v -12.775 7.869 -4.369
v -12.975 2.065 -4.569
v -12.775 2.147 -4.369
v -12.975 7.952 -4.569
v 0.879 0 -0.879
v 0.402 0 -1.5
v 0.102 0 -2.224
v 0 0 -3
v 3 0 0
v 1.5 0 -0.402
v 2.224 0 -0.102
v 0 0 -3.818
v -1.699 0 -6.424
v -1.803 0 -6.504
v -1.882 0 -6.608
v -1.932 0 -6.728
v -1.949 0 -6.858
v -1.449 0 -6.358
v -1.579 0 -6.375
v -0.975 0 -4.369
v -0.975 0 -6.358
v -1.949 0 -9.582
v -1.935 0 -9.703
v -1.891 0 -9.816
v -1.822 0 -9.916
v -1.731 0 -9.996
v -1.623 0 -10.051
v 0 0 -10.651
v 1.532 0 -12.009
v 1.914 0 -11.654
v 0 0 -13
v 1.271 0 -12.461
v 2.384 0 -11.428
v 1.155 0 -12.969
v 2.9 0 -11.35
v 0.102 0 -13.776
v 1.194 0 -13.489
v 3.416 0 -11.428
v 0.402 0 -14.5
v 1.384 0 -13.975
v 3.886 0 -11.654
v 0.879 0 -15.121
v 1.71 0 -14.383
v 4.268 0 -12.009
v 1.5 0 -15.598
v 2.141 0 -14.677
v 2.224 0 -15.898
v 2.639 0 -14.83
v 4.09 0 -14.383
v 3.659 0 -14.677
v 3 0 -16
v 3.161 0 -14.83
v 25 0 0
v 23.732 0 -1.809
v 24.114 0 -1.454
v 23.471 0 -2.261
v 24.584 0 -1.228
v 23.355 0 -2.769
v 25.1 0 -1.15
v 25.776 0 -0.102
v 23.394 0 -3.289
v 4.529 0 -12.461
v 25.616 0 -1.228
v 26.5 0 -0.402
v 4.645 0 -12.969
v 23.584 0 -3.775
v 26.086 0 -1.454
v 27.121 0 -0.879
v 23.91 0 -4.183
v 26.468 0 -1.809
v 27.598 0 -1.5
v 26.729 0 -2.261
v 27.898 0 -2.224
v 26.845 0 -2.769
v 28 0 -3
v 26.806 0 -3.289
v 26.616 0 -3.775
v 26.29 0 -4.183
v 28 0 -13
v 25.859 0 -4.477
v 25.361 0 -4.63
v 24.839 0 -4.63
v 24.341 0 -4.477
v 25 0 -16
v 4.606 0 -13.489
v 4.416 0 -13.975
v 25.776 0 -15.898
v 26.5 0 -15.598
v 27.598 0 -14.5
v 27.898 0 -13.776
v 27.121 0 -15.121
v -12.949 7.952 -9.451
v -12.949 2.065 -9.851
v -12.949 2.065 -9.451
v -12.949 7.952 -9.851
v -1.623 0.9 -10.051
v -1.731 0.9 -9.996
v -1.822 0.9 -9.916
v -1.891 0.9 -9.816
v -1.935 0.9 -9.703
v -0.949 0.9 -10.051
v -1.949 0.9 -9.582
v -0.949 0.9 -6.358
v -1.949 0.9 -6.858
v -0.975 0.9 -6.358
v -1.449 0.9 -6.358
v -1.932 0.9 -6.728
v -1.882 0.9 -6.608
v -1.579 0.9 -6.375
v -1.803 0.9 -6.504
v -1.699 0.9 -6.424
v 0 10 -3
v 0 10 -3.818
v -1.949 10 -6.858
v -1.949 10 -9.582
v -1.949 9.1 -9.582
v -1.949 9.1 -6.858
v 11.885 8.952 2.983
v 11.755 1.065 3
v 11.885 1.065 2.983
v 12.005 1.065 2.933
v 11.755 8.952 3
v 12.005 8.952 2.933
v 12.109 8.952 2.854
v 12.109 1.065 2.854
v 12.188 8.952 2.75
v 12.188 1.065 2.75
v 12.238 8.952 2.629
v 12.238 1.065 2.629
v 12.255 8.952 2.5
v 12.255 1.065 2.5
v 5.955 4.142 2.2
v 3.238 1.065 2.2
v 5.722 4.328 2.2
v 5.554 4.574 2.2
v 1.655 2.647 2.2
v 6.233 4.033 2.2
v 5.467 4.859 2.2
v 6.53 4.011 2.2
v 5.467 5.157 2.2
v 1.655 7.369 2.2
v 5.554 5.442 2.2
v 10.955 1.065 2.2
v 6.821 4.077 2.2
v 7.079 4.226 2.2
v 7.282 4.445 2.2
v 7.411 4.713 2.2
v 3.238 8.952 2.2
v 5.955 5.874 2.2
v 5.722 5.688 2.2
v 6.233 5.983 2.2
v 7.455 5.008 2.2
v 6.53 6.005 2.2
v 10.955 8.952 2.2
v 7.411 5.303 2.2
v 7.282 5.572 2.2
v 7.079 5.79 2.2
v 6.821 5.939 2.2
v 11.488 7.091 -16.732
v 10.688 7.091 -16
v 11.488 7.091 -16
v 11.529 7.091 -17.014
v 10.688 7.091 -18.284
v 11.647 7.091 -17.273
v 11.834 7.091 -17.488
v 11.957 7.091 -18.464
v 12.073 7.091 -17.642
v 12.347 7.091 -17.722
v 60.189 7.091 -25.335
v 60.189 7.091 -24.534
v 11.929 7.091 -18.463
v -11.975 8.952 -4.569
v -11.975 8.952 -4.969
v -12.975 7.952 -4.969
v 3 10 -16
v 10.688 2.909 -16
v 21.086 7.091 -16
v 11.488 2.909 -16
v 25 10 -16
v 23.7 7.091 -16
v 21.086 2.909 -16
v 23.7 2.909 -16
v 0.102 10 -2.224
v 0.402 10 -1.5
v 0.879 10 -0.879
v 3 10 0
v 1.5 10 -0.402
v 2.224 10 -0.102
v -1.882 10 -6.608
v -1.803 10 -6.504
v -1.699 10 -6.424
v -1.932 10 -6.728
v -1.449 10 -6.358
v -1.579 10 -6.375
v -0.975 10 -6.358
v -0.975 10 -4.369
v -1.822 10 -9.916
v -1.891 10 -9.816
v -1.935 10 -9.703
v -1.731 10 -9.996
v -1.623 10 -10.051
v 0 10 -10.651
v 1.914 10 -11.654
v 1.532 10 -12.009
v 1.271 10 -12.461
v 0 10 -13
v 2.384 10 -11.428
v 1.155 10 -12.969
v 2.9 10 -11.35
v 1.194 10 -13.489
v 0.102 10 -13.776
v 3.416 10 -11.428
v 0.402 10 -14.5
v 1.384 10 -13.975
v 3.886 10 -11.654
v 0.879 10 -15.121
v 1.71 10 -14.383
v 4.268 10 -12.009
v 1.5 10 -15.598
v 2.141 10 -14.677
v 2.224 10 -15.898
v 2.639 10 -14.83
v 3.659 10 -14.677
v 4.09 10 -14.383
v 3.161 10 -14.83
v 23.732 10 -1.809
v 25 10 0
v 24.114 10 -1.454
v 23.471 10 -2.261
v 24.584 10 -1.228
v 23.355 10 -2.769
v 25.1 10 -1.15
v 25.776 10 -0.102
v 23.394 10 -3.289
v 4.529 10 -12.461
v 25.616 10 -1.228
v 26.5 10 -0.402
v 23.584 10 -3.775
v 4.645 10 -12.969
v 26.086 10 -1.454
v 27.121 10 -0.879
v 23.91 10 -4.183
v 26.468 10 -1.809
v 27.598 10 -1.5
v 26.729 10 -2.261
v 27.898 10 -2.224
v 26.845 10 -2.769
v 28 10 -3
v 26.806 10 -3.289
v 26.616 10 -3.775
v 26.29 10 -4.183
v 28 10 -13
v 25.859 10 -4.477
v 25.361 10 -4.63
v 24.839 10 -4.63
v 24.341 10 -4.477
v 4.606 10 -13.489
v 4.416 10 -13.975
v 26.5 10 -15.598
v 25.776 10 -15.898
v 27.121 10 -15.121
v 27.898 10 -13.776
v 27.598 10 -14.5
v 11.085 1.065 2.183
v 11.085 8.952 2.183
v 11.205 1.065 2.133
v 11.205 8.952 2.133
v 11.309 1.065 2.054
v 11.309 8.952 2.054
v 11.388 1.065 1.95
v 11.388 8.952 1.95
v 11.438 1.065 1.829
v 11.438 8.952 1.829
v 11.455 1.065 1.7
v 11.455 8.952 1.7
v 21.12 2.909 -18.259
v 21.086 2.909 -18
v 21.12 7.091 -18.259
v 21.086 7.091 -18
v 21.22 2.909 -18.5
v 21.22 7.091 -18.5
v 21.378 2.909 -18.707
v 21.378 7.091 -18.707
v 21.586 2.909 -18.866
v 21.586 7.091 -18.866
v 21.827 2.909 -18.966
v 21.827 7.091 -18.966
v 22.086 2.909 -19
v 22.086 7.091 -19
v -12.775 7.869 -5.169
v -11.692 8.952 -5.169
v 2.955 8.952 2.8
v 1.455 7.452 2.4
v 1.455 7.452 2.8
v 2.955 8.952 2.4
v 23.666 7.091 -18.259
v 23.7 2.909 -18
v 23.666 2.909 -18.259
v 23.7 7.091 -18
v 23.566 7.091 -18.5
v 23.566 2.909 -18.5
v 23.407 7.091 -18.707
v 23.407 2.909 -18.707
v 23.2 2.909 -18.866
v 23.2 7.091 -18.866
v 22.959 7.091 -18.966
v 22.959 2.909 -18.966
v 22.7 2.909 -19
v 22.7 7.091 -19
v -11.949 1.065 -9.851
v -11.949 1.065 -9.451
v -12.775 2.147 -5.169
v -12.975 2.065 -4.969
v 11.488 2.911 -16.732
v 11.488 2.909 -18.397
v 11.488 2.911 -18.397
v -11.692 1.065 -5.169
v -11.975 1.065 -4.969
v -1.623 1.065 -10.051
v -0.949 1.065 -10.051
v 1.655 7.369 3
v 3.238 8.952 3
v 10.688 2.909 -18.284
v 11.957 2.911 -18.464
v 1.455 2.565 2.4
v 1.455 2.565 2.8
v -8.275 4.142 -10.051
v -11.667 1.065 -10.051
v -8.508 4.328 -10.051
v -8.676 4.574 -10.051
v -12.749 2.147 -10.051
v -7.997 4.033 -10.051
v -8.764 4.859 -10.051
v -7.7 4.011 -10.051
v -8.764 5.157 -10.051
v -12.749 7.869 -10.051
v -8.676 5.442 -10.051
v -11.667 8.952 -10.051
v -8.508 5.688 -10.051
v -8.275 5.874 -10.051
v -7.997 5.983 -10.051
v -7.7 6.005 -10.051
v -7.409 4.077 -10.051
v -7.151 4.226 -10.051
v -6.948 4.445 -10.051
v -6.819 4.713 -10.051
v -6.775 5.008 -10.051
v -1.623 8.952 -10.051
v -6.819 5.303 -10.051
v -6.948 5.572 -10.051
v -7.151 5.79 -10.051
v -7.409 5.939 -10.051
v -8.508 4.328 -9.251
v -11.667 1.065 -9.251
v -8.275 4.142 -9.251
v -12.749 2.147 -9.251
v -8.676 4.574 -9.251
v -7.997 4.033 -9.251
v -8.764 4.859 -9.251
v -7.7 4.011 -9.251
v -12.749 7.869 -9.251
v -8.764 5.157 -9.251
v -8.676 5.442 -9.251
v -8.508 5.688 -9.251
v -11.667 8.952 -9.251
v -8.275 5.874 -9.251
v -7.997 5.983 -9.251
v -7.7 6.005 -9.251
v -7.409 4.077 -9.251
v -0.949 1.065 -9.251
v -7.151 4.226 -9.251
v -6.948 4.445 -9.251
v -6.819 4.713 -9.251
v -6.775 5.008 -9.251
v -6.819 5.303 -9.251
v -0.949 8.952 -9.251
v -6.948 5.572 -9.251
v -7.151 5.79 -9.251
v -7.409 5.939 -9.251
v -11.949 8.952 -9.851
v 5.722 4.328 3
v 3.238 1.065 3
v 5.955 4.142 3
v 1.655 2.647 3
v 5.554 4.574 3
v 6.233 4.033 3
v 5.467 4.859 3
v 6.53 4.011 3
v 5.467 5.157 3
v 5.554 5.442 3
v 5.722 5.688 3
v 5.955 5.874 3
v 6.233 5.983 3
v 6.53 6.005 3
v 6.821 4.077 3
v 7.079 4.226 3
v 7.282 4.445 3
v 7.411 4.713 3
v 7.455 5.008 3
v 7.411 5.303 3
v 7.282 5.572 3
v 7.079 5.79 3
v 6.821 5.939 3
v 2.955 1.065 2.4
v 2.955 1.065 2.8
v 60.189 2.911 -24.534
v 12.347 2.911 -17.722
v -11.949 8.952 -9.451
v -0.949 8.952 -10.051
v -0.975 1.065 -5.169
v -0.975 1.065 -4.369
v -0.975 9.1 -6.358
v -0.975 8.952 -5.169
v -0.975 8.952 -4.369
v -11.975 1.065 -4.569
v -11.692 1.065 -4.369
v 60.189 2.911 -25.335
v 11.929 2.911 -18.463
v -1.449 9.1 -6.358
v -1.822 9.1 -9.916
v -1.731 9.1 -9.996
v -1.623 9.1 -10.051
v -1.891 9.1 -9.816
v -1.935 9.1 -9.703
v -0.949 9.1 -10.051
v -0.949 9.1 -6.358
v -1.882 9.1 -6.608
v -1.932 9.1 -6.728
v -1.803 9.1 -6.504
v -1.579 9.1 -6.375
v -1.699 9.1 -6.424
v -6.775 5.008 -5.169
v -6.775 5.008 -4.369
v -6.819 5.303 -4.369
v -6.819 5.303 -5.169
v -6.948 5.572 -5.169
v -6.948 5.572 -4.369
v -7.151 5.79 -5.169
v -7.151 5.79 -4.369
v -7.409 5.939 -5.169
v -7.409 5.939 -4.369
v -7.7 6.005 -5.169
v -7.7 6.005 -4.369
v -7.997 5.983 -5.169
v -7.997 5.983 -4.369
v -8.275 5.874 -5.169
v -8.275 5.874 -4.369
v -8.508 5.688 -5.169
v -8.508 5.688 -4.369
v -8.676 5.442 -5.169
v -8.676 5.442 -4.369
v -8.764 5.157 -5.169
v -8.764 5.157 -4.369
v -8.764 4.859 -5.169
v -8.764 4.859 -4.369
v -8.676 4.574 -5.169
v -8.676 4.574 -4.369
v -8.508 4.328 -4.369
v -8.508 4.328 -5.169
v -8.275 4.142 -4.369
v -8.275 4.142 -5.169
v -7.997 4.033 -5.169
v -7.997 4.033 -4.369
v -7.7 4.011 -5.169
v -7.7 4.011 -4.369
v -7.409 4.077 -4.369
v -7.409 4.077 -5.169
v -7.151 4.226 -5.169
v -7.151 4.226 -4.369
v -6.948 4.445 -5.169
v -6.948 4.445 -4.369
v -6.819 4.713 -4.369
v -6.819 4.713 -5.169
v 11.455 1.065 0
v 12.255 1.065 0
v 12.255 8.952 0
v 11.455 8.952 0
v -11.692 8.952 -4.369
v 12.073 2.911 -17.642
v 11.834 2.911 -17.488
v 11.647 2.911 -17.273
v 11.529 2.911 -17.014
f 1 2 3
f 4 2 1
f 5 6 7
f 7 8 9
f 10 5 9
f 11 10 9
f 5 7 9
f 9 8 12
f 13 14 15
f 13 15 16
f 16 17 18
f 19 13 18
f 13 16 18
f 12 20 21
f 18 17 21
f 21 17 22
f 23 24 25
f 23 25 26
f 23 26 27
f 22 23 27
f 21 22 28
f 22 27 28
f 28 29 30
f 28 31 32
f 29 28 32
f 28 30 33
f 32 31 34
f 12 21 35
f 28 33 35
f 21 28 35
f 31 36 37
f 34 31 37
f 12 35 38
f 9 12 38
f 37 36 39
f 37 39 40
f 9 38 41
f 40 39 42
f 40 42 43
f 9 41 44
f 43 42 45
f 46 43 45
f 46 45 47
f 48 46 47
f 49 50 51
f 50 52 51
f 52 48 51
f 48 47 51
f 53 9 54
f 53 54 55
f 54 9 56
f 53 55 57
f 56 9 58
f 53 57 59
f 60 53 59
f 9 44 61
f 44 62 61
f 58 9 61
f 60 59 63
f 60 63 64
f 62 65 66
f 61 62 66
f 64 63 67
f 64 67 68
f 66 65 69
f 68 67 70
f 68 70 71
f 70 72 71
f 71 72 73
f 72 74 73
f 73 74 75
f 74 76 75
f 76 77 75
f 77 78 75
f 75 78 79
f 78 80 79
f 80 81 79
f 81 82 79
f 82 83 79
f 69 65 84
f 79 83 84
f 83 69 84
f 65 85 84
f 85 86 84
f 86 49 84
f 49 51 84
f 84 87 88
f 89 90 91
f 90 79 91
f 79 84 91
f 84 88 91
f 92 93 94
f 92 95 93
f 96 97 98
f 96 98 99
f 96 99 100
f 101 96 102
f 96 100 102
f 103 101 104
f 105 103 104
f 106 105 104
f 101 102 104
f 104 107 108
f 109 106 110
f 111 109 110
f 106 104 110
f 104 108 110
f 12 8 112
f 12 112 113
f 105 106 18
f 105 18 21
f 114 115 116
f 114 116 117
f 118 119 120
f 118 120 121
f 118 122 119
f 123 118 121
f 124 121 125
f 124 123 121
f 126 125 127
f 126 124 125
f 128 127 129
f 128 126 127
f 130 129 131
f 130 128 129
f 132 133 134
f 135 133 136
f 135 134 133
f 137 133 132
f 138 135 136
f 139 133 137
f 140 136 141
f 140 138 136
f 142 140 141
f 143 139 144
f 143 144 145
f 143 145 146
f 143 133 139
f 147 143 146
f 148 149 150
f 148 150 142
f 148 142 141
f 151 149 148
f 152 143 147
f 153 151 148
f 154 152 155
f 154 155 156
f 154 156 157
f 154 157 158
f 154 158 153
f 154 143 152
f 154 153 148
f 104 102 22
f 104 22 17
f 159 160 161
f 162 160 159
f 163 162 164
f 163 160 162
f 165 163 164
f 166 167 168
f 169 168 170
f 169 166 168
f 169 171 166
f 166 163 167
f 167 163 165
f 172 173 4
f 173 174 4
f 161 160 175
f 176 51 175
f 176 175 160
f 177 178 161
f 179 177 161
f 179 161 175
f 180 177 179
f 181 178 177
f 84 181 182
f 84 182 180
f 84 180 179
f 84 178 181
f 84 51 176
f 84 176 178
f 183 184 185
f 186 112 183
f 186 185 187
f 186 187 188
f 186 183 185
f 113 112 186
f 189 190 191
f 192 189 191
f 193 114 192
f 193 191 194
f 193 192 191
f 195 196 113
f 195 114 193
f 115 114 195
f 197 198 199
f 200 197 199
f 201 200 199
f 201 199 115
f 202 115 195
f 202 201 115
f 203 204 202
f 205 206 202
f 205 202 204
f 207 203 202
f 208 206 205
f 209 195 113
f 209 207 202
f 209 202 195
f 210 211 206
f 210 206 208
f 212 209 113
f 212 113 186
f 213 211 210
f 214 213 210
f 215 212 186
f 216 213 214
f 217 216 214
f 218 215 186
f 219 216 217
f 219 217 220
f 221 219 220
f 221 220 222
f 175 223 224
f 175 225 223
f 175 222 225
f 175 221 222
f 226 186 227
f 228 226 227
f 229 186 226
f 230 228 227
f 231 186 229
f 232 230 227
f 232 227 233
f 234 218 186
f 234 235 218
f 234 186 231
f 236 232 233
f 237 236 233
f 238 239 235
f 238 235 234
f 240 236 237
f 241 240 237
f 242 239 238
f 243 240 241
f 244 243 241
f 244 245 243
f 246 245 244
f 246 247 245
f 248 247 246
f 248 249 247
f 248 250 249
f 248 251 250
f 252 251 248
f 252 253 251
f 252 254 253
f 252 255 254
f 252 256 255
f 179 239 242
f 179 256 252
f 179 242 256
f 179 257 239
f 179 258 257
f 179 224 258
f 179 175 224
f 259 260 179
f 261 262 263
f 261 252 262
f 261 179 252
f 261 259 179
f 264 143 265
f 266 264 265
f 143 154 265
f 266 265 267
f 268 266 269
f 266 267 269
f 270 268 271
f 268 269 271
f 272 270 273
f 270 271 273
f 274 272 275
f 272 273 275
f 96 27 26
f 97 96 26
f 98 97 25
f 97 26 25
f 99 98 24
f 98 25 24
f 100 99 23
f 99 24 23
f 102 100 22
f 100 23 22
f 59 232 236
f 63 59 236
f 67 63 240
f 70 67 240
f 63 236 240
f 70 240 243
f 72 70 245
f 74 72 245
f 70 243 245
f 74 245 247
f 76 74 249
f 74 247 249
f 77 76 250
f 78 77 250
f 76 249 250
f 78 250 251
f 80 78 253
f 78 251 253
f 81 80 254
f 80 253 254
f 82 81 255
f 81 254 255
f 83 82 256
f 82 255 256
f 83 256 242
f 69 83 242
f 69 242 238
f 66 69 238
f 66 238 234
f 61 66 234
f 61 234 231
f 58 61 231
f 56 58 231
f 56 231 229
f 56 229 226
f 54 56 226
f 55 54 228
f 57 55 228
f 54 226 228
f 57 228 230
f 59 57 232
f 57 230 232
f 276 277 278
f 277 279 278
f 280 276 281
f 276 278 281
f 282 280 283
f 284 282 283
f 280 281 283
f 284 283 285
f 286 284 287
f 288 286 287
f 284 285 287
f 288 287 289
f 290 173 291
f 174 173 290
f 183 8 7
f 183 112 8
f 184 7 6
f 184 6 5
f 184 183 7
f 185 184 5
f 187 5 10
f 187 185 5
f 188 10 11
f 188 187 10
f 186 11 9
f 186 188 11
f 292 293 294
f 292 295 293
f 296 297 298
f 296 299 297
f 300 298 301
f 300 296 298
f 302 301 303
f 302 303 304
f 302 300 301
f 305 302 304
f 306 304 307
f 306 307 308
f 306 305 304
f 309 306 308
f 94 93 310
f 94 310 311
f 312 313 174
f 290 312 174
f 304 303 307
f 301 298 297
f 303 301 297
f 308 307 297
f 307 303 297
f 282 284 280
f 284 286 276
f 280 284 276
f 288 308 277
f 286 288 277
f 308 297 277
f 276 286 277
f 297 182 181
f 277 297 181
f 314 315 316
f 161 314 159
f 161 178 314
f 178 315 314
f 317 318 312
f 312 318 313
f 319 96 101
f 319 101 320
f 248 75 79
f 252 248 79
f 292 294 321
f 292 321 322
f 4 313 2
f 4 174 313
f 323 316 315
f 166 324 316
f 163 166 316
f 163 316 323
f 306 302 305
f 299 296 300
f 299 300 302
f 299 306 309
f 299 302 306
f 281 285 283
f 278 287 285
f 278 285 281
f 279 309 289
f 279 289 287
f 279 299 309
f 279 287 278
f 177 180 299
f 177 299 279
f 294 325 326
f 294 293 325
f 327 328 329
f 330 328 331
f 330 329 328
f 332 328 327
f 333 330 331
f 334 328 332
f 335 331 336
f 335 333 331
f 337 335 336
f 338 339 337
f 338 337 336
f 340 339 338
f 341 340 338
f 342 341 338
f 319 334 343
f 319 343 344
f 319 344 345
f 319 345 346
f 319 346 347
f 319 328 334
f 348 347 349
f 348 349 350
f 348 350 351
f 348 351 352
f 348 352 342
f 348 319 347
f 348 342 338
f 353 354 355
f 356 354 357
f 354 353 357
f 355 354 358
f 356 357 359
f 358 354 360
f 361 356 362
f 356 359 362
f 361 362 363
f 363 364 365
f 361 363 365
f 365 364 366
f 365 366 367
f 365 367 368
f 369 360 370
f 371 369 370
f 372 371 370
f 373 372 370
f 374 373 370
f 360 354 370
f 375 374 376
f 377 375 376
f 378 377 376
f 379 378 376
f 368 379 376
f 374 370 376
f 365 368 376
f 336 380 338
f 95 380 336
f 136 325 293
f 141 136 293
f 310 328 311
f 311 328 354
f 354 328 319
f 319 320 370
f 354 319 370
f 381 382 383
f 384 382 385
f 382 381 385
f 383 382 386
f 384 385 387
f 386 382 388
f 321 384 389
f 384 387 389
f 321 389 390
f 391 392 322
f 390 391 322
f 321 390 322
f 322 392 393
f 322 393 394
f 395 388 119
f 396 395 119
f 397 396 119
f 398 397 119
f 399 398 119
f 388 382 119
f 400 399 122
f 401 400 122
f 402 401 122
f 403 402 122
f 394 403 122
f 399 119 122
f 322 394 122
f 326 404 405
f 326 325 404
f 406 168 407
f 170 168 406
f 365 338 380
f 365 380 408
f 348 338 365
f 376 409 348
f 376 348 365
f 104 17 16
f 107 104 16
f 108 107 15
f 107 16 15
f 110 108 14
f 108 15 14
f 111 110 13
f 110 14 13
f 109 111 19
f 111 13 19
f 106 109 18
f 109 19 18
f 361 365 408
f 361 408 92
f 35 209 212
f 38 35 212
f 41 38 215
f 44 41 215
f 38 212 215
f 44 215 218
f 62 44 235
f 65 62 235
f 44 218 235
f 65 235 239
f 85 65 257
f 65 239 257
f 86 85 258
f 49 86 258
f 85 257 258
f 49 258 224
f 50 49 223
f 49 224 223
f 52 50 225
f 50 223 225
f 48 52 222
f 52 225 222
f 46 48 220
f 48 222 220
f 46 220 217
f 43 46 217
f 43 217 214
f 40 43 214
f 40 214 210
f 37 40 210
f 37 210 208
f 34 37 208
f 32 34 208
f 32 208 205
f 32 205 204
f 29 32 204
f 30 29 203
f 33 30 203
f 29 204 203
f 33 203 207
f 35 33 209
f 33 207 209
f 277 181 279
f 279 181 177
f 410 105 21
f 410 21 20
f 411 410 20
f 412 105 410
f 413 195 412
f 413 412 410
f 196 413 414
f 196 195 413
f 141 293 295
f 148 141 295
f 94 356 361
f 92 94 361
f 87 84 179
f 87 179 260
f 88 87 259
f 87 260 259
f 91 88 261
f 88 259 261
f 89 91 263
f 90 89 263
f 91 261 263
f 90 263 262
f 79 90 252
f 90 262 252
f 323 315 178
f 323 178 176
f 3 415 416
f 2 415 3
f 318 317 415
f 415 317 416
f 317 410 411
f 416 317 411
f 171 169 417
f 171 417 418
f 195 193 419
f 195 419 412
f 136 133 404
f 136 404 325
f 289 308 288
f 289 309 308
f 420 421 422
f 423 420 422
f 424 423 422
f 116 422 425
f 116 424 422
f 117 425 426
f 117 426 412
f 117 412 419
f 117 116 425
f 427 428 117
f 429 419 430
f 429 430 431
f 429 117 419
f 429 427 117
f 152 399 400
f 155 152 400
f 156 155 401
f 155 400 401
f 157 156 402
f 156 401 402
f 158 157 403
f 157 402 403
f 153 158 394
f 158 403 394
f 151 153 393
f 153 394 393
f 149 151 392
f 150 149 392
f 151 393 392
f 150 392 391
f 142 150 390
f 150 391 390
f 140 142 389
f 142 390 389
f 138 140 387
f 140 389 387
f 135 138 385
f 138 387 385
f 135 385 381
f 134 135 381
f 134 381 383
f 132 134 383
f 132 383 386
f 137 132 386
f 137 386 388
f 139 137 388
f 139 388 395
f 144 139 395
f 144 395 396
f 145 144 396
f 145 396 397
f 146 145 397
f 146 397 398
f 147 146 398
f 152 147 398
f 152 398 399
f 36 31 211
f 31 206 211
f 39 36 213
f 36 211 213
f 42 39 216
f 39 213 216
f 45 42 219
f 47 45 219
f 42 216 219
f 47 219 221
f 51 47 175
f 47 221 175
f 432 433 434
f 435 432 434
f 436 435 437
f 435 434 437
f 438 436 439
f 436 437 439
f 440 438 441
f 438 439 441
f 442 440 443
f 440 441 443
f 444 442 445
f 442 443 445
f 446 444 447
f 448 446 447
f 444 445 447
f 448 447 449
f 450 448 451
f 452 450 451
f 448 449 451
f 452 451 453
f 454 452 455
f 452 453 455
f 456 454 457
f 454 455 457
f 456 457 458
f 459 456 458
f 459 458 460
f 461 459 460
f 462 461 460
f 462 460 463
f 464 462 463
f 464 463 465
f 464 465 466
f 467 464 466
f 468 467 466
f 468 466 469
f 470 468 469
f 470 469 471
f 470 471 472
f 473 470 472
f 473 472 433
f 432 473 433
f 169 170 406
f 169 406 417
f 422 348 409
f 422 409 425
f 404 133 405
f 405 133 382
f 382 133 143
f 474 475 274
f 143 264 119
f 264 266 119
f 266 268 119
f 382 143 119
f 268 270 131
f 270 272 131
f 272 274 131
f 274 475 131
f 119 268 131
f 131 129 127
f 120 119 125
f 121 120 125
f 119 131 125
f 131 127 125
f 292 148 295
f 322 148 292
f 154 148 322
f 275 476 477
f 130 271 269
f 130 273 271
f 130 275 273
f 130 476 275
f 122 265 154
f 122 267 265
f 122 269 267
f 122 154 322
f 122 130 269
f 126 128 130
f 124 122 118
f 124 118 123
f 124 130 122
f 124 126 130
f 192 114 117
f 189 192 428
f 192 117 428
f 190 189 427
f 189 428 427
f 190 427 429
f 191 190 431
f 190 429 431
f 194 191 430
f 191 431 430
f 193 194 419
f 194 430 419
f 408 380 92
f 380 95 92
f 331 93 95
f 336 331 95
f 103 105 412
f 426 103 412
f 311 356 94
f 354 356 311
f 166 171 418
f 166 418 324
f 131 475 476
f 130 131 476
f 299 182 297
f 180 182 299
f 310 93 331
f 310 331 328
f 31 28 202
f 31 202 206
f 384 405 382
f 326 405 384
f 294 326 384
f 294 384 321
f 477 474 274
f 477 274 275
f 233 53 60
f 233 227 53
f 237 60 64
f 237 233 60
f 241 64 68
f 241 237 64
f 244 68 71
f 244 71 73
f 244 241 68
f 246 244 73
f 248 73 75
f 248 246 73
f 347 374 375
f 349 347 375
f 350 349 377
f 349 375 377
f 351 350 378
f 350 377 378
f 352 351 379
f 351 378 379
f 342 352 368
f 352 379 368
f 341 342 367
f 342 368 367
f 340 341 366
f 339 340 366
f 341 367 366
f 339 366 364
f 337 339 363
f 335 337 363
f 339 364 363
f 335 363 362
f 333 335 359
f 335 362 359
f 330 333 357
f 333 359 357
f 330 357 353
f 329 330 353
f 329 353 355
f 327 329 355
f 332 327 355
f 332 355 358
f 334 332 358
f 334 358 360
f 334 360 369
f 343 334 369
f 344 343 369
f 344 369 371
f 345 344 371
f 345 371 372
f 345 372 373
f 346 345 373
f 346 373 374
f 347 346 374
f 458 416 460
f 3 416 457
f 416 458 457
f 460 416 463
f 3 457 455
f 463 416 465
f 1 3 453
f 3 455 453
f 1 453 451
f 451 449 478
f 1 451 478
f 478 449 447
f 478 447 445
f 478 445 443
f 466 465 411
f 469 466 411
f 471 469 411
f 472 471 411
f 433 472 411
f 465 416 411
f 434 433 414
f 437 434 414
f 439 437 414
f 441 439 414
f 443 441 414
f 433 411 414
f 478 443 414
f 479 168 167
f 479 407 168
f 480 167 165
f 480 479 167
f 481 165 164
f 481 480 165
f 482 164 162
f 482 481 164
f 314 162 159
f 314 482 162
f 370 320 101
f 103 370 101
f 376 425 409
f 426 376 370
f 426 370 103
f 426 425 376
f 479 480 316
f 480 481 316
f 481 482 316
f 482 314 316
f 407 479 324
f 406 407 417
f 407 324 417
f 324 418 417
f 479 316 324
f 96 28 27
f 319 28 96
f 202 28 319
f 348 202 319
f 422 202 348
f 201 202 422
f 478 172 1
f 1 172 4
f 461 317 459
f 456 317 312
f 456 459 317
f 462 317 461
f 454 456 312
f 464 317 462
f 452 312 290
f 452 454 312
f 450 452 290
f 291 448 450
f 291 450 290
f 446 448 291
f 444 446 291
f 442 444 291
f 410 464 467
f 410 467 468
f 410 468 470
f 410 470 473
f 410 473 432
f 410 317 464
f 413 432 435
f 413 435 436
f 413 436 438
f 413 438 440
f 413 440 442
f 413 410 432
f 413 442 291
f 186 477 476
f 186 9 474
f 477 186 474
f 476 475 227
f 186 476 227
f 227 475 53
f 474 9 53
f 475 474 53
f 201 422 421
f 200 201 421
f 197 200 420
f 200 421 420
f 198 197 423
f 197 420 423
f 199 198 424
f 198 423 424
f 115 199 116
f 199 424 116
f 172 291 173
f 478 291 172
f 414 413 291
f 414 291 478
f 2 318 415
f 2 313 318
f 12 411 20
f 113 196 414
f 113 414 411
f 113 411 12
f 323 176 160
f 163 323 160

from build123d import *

# Parameters (mm, degrees)
SKETCH1_W            = 28
SKETCH1_H            = 16
BOSS_EXTRUDE1_DEPTH  = 10
SKETCH3_R            = 1.75
CUT_EXTRUDE1_DEPTH   = 10
FILLET5_R            = 3
FILLET6_R            = 3
BOSS_EXTRUDE3_DEPTH  = 10
FILLET7_R            = 0.5
FILLET8_R            = 0.5
SKETCH5_W            = 3.693864044
SKETCH5_H            = 8.2
CUT_EXTRUDE2_DEPTH   = 1
SKETCH7_W            = 0.8
SKETCH7_H            = 7.887258378
BOSS_EXTRUDE5_DEPTH  = 12
SKETCH8_W            = 0.8
SKETCH8_H            = 7.887258378
BOSS_EXTRUDE6_DEPTH  = 12
CHAMFER1_SIZE        = 1
CHAMFER3_SIZE        = 0.2
SKETCH10_R           = 1
CUT_EXTRUDE3_DEPTH   = 8
SKETCH11_W           = 0.8
SKETCH11_H           = 7.887258378
BOSS_EXTRUDE7_DEPTH  = 3
SKETCH12_W           = 0.8
SKETCH12_H           = 7.887258378
BOSS_EXTRUDE8_DEPTH  = 10
FILLET9_R            = 0.5
FILLET10_R           = 0.5
CHAMFER4_SIZE        = 1.5
CHAMFER5_SIZE        = 0.2
SKETCH13_R           = 1
CUT_EXTRUDE4_DEPTH   = 1
SKETCH14_W           = 2.614438376
SKETCH14_H           = 4.181373928
BOSS_EXTRUDE10_DEPTH = 3
FILLET12_R           = 1
SKETCH17_W           = 0.8
SKETCH17_H           = 4.181373928
BOSS_EXTRUDE11_DEPTH = 2.4
BOSS_EXTRUDE12_DEPTH = 4.18
CUT_EXTRUDE9_DEPTH   = 5
FILLET14_R           = 1


with BuildPart() as part:
    # Sketch1 → Boss-Extrude1 (new body)
    with BuildSketch(Plane(origin=(0, 0, 0), x_dir=(1, 0, 0), z_dir=(0, 1, 0))):
        with Locations((14, 8)):
            Rectangle(SKETCH1_W, SKETCH1_H)
    extrude(amount=BOSS_EXTRUDE1_DEPTH)

    # Sketch3 → Cut-Extrude1 (cut)
    with BuildSketch(Plane(origin=(0, 10, 0), x_dir=(1, 0, 0), z_dir=(0, 1, 0))):
        with Locations(Location((2.9, 13.1, 0), (0, 0, 270))):
            Circle(SKETCH3_R)
        with Locations(Location((25.1, 2.9, 0), (0, 0, 270))):
            Circle(SKETCH3_R)
    extrude(amount=-CUT_EXTRUDE1_DEPTH, mode=Mode.SUBTRACT)

    # Fillet5
    fillet5_edges = [part.edges().sort_by_distance(p)[0] for p in [
        (0, 5, -16),
        (28, 5, 0),
    ]]
    fillet(fillet5_edges, radius=FILLET5_R)

    # Fillet6
    fillet6_edges = [part.edges().sort_by_distance(p)[0] for p in [
        (28, 5, -16),
        (0, 5, 0),
    ]]
    fillet(fillet6_edges, radius=FILLET6_R)

    # Sketch4 → Boss-Extrude3 (add)
    with BuildSketch(Plane(origin=(0, 10, 0), x_dir=(1, 0, 0), z_dir=(0, 1, 0))):
        Polygon((0, 10.651040916), (-1.949468991, 9.930649363), (-1.949468991, 6.357507258), (-0.974734495, 6.357507258), (-0.974734495, 4.369226571), (0.098482911, 3.762363811), align=None)
    extrude(amount=-BOSS_EXTRUDE3_DEPTH)

    # Fillet7
    fillet7_edges = [part.edges().sort_by_distance(p)[0] for p in [
        (-1.949468991, 5, -9.930649363),
    ]]
    fillet(fillet7_edges, radius=FILLET7_R)

    # Fillet8
    fillet8_edges = [part.edges().sort_by_distance(p)[0] for p in [
        (-1.949468991, 5, -6.357507258),
    ]]
    fillet(fillet8_edges, radius=FILLET8_R)

    # Sketch5 → Cut-Extrude2 (cut)
    with BuildSketch(Plane.ZY.offset(1.949468991)):
        with Locations((-8.20443928, 5)):
            Rectangle(SKETCH5_W, SKETCH5_H)
    extrude(amount=-CUT_EXTRUDE2_DEPTH, mode=Mode.SUBTRACT)

    # Sketch7 → Boss-Extrude5 (add)
    with BuildSketch(Plane.ZY.offset(0.949468991)):
        with Locations((-9.651371302, 5.008233046)):
            Rectangle(SKETCH7_W, SKETCH7_H)
    extrude(amount=BOSS_EXTRUDE5_DEPTH)

    # Sketch8 → Boss-Extrude6 (add)
    with BuildSketch(Plane.ZY.offset(0.974734495)):
        with Locations((-4.769226571, 5.008233046)):
            Rectangle(SKETCH8_W, SKETCH8_H)
    extrude(amount=BOSS_EXTRUDE6_DEPTH)

    # Chamfer1
    chamfer1_edges = [part.edges().sort_by_distance(p)[0] for p in [
        (-12.949468991, 1.064603857, -9.651371302),
        (-12.949468991, 8.951862235, -9.651371302),
        (-12.974734495, 8.951862235, -4.769226571),
        (-12.974734495, 1.064603857, -4.769226571),
    ]]
    chamfer(chamfer1_edges, length=CHAMFER1_SIZE)

    # Chamfer3
    chamfer3_edges = [part.edges().sort_by_distance(p)[0] for p in [
        (-12.949468991, 5.008233046, -10.051371302),
        (-12.949468991, 5.008233046, -9.251371302),
        (-12.449468991, 8.451862235, -9.251371302),
        (-12.449468991, 1.564603857, -9.251371302),
        (-12.449468991, 8.451862235, -10.051371302),
        (-12.449468991, 1.564603857, -10.051371302),
        (-12.974734495, 5.008233046, -4.369226571),
        (-12.974734495, 5.008233046, -5.169226571),
        (-12.474734495, 8.451862235, -4.369226571),
        (-12.474734495, 1.564603857, -4.369226571),
        (-12.474734495, 8.451862235, -5.169226571),
        (-12.474734495, 1.564603857, -5.169226571),
    ]]
    chamfer(chamfer3_edges, length=CHAMFER3_SIZE)

    # Sketch10 → Cut-Extrude3 (cut)
    with BuildSketch(Plane.XY.offset(-4.369226571)):
        with Locations((-7.774734495, 5.008233046)):
            Circle(SKETCH10_R)
    extrude(amount=-CUT_EXTRUDE3_DEPTH, mode=Mode.SUBTRACT)

    # Sketch11 → Boss-Extrude7 (add)
    with BuildSketch(Plane.XY):
        with Locations((11.855374497, 5.008233046)):
            Rectangle(SKETCH11_W, SKETCH11_H)
    extrude(amount=BOSS_EXTRUDE7_DEPTH)

    # Sketch12 → Boss-Extrude8 (add)
    with BuildSketch(Plane.ZY.offset(-11.455374497)):
        with Locations((2.6, 5.008233046)):
            Rectangle(SKETCH12_W, SKETCH12_H)
    extrude(amount=BOSS_EXTRUDE8_DEPTH)

    # Fillet9
    fillet9_edges = [part.edges().sort_by_distance(p)[0] for p in [
        (11.455374497, 5.008233046, 2.2),
    ]]
    fillet(fillet9_edges, radius=FILLET9_R)

    # Fillet10
    fillet10_edges = [part.edges().sort_by_distance(p)[0] for p in [
        (12.255374497, 5.008233046, 3),
    ]]
    fillet(fillet10_edges, radius=FILLET10_R)

    # Chamfer4
    chamfer4_edges = [part.edges().sort_by_distance(p)[0] for p in [
        (1.455374497, 8.951862235, 2.6),
        (1.455374497, 1.064603857, 2.6),
    ]]
    chamfer(chamfer4_edges, length=CHAMFER4_SIZE)

    # Chamfer5
    chamfer5_edges = [part.edges().sort_by_distance(p)[0] for p in [
        (1.455374497, 5.008233046, 3),
        (1.455374497, 5.008233046, 2.2),
        (2.205374497, 8.201862235, 3),
        (2.205374497, 1.814603857, 3),
        (2.205374497, 8.201862235, 2.2),
        (2.205374497, 1.814603857, 2.2),
    ]]
    chamfer(chamfer5_edges, length=CHAMFER5_SIZE)

    # Sketch13 → Cut-Extrude4 (cut)
    with BuildSketch(Plane.XY.offset(3)):
        with Locations((6.455374497, 5.008233046)):
            Circle(SKETCH13_R)
    extrude(amount=-CUT_EXTRUDE4_DEPTH, mode=Mode.SUBTRACT)

    # Sketch14 → Boss-Extrude10 (add)
    with BuildSketch(Plane(origin=(0, 0, -16), x_dir=(-1, 0, 0), z_dir=(0, 0, -1))):
        with Locations((-22.392780812, 5)):
            Rectangle(SKETCH14_W, SKETCH14_H)
    extrude(amount=BOSS_EXTRUDE10_DEPTH)

    # Fillet12
    fillet12_edges = [part.edges().sort_by_distance(p)[0] for p in [
        (23.7, 5, -19),
        (21.085561624, 5, -19),
    ]]
    fillet(fillet12_edges, radius=FILLET12_R)

    # Sketch17 → Boss-Extrude11 (add)
    with BuildSketch(Plane(origin=(0, 0, -16), x_dir=(-1, 0, 0), z_dir=(0, 0, -1))):
        with Locations((-11.087924536, 5)):
            Rectangle(SKETCH17_W, SKETCH17_H)
    extrude(amount=BOSS_EXTRUDE11_DEPTH)

    # Sketch18 → Boss-Extrude12 (add)
    with BuildSketch(Plane(origin=(0, 7.090686964, 0), x_dir=(1, 0, 0), z_dir=(0, 1, 0))):
        Polygon((60.18861552, 25.33460318), (11.487924536, 18.4), (11.487924536, 17.599656508), (60.18861552, 24.534259688), align=None)
    extrude(amount=-BOSS_EXTRUDE12_DEPTH)

    # Sketch20 → Cut-Extrude9 (cut)
    with BuildSketch(Plane(origin=(0, 7.090686964, 0), x_dir=(1, 0, 0), z_dir=(0, 1, 0))):
        Polygon((11.956915688, 18.464207931), (10.687924536, 18.283513368), (10.687924536, 18.4), align=None)
    extrude(amount=-CUT_EXTRUDE9_DEPTH, mode=Mode.SUBTRACT)

    # Fillet14
    fillet14_edges = [part.edges().sort_by_distance(p)[0] for p in [
        (11.487924536, 5.000686964, -17.599656508),
    ]]
    fillet(fillet14_edges, radius=FILLET14_R)


solid = part.part
